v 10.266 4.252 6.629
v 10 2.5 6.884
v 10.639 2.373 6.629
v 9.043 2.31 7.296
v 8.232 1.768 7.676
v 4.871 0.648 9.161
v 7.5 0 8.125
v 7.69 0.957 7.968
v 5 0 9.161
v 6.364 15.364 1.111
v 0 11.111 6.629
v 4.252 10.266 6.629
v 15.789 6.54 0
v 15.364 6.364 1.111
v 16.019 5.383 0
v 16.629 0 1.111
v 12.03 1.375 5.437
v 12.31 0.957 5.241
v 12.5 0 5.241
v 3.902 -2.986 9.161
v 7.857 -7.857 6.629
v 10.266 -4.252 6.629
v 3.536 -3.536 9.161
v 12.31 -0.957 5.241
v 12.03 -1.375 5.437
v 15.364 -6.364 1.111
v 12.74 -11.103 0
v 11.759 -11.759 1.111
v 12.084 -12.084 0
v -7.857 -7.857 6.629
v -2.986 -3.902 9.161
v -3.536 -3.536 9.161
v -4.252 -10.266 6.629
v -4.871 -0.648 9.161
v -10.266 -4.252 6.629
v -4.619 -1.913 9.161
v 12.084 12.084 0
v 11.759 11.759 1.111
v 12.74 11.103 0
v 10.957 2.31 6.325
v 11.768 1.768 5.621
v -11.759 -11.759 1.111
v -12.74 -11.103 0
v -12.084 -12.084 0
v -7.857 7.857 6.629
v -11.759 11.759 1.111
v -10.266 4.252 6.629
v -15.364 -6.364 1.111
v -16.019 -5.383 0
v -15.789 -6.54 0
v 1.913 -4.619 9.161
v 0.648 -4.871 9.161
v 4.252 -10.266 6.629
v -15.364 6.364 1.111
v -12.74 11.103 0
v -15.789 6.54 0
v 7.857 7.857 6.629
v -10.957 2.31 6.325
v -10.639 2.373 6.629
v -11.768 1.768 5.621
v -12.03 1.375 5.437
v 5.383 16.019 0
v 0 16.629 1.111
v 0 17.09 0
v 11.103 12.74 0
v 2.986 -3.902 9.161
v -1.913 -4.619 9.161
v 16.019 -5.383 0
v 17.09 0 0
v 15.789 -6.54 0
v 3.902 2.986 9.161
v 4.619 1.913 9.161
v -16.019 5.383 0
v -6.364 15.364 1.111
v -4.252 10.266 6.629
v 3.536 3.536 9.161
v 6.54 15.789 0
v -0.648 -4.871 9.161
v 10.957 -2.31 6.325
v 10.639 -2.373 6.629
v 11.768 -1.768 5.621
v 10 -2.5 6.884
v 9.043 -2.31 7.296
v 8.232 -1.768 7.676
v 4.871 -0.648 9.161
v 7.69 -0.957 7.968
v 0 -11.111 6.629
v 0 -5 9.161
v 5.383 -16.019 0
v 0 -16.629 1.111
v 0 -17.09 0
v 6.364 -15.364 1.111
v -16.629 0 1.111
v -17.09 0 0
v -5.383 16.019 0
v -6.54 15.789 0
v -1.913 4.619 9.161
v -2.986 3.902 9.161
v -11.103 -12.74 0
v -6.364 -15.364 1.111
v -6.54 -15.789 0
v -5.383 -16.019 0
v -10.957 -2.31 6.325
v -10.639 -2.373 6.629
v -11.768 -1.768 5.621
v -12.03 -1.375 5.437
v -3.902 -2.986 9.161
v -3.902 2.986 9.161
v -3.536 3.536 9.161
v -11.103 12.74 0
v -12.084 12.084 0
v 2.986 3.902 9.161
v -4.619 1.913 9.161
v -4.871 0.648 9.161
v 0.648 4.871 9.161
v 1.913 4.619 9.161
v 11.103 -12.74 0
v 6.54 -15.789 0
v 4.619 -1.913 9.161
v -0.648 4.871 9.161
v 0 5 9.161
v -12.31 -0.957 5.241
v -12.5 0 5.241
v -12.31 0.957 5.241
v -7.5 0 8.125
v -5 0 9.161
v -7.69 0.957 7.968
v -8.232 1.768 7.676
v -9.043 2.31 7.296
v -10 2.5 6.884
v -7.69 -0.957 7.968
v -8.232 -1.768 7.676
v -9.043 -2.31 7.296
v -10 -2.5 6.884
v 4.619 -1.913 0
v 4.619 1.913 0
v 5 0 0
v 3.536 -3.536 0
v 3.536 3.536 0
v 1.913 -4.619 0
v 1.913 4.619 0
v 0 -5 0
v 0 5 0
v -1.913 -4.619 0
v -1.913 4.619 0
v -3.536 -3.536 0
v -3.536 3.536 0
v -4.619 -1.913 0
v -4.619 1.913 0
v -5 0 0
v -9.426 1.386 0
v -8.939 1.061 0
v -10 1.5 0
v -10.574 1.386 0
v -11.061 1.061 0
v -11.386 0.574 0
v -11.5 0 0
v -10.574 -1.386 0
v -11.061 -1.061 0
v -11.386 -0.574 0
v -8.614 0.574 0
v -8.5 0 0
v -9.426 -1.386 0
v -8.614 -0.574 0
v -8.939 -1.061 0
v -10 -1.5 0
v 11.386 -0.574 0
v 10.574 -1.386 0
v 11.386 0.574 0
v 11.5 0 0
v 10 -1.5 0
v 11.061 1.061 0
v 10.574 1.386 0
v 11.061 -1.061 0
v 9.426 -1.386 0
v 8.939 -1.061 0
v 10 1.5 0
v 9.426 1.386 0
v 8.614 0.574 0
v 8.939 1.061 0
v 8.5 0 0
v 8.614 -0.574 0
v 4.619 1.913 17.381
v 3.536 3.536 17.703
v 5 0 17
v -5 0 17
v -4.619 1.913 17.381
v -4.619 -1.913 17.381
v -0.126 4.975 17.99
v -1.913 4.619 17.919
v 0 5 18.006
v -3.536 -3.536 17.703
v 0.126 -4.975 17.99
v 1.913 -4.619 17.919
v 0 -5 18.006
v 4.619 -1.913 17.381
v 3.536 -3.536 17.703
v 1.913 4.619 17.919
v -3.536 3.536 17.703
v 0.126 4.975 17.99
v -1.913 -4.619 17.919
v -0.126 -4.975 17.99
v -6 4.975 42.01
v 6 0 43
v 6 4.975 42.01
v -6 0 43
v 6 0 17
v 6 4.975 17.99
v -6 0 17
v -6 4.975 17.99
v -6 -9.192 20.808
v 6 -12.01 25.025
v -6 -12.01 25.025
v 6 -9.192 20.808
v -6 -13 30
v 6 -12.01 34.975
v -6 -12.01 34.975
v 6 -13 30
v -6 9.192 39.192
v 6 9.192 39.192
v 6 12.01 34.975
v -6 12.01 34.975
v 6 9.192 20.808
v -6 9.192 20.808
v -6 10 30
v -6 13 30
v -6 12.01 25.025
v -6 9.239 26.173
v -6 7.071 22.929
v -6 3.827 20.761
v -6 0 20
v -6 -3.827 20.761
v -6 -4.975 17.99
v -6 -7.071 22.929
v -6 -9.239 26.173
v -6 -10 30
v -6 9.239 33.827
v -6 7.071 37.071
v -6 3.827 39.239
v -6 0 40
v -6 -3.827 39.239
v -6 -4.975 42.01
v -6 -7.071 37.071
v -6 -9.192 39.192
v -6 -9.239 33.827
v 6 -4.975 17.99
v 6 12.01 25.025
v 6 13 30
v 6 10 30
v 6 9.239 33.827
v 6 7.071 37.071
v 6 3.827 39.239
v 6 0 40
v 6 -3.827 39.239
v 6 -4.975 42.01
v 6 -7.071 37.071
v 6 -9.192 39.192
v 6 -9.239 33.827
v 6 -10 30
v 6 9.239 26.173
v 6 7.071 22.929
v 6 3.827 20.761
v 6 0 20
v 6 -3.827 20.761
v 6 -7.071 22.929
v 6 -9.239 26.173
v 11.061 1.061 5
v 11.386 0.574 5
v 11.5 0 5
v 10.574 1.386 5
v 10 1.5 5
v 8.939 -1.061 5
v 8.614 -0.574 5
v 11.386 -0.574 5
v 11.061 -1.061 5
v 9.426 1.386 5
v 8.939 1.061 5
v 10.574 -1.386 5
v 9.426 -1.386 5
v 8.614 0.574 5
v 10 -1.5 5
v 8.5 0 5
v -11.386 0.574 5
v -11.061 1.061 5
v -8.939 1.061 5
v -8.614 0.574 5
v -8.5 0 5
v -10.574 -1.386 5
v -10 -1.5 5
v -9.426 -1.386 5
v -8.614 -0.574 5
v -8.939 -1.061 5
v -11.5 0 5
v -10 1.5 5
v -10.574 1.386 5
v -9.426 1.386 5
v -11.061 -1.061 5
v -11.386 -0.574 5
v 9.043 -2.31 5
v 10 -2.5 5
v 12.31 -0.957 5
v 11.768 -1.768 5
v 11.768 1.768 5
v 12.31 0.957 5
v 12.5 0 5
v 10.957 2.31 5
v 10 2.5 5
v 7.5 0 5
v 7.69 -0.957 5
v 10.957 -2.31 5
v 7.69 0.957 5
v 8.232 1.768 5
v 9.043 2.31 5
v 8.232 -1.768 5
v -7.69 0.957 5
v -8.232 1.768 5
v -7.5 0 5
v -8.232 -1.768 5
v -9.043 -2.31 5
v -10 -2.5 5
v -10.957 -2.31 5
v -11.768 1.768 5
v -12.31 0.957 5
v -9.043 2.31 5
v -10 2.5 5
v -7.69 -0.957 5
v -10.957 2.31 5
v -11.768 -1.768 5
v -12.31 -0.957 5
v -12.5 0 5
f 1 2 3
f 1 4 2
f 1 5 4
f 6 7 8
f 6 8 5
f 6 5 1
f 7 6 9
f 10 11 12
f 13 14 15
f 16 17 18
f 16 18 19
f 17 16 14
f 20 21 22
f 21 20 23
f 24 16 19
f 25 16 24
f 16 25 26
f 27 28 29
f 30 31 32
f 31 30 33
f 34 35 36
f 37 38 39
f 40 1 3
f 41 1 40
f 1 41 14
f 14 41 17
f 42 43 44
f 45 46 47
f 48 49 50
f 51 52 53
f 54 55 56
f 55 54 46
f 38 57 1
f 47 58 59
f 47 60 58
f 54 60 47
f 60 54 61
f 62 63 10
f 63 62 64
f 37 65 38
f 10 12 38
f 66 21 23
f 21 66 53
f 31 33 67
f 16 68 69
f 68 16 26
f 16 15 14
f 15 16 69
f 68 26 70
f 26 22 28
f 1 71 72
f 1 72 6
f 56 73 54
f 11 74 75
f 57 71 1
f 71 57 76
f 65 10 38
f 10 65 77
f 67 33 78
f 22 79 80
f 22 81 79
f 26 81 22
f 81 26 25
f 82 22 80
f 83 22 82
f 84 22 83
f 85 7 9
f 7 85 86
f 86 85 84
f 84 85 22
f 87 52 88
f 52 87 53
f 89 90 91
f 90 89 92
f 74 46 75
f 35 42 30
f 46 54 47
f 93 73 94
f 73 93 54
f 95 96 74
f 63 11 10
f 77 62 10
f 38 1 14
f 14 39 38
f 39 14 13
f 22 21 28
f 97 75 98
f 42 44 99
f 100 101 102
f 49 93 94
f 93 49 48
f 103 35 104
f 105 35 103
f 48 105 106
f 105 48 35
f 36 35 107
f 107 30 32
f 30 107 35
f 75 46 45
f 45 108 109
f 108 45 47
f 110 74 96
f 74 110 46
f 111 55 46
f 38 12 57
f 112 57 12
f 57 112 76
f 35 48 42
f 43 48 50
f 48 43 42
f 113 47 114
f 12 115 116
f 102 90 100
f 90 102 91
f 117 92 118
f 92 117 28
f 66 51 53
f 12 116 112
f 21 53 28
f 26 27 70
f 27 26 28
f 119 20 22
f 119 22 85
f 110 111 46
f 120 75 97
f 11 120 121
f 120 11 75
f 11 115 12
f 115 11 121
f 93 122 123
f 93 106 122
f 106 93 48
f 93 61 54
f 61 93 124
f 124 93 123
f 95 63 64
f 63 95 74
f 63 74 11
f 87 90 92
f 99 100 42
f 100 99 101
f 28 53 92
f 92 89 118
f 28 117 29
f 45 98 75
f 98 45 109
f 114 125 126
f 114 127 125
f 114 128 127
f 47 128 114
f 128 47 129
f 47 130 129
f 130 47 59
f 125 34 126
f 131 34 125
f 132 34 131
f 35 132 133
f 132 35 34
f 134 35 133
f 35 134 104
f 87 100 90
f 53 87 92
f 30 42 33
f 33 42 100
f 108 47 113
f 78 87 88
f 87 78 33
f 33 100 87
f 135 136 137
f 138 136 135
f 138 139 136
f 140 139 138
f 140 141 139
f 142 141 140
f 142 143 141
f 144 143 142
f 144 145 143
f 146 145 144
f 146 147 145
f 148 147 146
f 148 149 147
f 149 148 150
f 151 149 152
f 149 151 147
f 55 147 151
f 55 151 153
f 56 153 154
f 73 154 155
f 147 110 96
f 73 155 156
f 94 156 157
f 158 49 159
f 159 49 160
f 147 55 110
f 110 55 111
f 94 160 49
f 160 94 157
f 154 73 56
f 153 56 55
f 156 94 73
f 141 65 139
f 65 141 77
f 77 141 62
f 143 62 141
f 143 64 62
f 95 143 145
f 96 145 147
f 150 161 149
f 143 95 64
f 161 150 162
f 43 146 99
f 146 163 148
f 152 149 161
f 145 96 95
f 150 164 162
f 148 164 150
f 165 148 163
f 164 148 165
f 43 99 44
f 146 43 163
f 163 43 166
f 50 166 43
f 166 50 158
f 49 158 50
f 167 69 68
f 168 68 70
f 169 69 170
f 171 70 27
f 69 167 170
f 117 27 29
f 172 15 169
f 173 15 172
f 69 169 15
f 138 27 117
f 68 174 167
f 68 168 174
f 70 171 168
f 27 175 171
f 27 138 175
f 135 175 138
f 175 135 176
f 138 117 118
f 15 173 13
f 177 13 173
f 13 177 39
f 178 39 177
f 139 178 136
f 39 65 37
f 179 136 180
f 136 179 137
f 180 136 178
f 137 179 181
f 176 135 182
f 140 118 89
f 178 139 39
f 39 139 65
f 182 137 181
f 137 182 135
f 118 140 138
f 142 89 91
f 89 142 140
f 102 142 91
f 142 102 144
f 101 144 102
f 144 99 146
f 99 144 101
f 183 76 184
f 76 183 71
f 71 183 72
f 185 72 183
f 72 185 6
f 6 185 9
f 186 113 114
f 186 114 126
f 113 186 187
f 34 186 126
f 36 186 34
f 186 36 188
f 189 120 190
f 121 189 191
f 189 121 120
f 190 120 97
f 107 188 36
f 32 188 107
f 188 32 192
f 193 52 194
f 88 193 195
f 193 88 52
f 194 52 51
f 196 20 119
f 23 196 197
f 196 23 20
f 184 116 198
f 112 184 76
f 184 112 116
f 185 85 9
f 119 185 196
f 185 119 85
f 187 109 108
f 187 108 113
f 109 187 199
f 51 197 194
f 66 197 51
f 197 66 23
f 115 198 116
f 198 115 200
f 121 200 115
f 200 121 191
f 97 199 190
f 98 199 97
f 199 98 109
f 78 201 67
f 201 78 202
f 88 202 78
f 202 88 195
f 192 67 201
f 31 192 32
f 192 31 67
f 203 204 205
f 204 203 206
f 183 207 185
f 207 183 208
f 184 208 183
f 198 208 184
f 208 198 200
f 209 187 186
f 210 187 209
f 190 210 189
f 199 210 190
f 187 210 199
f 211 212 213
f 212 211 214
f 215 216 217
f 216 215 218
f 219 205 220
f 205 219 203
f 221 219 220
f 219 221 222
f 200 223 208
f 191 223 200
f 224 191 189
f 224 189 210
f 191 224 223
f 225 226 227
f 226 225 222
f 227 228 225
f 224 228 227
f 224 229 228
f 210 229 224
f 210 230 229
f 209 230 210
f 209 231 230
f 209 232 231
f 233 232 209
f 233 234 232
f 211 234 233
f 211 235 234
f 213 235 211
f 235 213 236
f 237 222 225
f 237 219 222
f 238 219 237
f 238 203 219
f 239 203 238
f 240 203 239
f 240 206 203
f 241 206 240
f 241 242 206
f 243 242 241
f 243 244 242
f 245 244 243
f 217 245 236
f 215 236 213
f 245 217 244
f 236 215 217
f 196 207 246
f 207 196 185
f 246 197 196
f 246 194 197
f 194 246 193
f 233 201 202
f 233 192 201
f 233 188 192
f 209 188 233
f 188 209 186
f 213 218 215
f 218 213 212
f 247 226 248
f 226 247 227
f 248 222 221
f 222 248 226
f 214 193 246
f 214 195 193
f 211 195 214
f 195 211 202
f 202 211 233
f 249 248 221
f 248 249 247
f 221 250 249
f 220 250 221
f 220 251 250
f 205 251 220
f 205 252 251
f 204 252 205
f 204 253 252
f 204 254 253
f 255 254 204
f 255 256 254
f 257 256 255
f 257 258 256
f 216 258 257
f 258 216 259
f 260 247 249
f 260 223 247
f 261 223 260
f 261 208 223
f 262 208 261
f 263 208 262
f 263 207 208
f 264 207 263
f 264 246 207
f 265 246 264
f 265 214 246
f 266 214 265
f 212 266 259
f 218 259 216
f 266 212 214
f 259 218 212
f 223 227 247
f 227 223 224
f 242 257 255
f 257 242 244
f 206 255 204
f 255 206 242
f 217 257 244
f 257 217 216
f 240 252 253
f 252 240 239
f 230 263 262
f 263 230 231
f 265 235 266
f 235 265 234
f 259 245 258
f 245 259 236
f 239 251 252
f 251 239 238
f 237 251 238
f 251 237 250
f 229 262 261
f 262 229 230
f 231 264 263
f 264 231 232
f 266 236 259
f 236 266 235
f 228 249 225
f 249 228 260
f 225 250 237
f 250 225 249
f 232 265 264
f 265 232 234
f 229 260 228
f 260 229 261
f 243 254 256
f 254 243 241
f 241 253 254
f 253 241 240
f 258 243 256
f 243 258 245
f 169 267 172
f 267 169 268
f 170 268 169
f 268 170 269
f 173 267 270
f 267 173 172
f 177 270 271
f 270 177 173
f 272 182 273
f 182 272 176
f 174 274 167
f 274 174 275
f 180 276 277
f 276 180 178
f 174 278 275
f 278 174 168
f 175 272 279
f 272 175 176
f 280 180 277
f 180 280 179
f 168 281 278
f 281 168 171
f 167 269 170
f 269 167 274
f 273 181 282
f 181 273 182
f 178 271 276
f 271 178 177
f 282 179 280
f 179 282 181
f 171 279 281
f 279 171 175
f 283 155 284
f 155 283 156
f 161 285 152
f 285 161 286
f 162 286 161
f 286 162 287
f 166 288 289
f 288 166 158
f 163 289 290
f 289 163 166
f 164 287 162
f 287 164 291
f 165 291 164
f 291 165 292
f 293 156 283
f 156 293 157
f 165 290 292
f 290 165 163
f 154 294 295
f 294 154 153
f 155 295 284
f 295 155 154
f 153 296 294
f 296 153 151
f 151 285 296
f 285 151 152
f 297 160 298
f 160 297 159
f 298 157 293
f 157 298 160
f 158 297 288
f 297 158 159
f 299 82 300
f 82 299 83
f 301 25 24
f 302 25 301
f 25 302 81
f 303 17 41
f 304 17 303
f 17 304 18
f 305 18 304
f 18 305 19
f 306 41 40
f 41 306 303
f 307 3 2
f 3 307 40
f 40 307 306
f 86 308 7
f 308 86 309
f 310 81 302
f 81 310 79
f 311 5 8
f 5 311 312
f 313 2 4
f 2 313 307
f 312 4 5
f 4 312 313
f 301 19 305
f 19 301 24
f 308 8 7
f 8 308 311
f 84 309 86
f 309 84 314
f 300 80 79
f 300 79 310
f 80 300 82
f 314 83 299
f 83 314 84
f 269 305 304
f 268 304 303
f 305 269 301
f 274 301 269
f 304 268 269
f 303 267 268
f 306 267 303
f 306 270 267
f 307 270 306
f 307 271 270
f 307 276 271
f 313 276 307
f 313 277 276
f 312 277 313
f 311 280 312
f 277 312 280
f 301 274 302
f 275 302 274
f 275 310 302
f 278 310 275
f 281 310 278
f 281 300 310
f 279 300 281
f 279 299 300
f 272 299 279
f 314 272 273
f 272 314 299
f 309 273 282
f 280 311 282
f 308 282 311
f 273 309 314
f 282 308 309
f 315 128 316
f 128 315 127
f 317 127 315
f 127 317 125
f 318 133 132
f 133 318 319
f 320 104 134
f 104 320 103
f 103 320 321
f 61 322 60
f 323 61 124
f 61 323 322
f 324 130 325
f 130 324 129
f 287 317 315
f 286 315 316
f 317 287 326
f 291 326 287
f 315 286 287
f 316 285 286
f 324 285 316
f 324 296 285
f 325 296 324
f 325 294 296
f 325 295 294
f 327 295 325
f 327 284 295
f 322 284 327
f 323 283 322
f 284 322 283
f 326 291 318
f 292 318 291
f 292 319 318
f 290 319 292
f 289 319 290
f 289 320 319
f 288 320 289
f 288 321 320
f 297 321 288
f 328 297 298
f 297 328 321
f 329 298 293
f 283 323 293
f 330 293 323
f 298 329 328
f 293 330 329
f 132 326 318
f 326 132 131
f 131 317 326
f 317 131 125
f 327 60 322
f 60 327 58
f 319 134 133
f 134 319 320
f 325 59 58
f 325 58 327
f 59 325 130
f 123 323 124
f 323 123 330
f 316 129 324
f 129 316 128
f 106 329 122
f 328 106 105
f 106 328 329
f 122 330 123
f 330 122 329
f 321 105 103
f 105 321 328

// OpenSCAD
$fn = 16;

// in mn

base_diameter = 40;
cylinder_diameter = base_diameter/4;
cylinger_height = 20;
pole_diamter = 20;
screw_Size = 3;
screw_head_size = 5;

module screw_holes()
{
  union(){
    translate([base_diameter*0.25,0,0]) cylinder(h=base_diameter,r=screw_Size/2,center=true);
    translate([base_diameter*-0.25,0,0]) cylinder(h=base_diameter,r=screw_Size/2,center=true);            
    translate([base_diameter*0.25,0,(base_diameter/2)+(base_diameter*.125)]) cylinder(h=base_diameter,r=screw_head_size/2,center=true);
    translate([base_diameter*-0.25,0,(base_diameter/2)+(base_diameter*.125)]) cylinder(h=base_diameter,r=screw_head_size/2,center=true);            
  }
}

module pole()
{

  difference() {
    translate([0,0,-base_diameter/4]) sphere(d=base_diameter, center=true);
    translate([0,0,-base_diameter/2]) cube([base_diameter+1,base_diameter+1,base_diameter], center=true);    
  }

  difference(){
    union() {      
      cylinder(h=cylinger_height+(pole_diamter/2),r1=cylinder_diameter/2,r2=cylinder_diameter/2,center=false);
      translate([0,0,cylinger_height+(pole_diamter/2)]) rotate([0,90,0]) cylinder(h=base_diameter*0.3,r=(pole_diamter/2)+3,center=true);
    }
    translate([0,0,cylinger_height+(pole_diamter/2)]) rotate([0,90,0]) cylinder(h=base_diameter,r=(pole_diamter/2),center=true);  
  }
}

difference()
{
  pole();
  screw_holes();
}
